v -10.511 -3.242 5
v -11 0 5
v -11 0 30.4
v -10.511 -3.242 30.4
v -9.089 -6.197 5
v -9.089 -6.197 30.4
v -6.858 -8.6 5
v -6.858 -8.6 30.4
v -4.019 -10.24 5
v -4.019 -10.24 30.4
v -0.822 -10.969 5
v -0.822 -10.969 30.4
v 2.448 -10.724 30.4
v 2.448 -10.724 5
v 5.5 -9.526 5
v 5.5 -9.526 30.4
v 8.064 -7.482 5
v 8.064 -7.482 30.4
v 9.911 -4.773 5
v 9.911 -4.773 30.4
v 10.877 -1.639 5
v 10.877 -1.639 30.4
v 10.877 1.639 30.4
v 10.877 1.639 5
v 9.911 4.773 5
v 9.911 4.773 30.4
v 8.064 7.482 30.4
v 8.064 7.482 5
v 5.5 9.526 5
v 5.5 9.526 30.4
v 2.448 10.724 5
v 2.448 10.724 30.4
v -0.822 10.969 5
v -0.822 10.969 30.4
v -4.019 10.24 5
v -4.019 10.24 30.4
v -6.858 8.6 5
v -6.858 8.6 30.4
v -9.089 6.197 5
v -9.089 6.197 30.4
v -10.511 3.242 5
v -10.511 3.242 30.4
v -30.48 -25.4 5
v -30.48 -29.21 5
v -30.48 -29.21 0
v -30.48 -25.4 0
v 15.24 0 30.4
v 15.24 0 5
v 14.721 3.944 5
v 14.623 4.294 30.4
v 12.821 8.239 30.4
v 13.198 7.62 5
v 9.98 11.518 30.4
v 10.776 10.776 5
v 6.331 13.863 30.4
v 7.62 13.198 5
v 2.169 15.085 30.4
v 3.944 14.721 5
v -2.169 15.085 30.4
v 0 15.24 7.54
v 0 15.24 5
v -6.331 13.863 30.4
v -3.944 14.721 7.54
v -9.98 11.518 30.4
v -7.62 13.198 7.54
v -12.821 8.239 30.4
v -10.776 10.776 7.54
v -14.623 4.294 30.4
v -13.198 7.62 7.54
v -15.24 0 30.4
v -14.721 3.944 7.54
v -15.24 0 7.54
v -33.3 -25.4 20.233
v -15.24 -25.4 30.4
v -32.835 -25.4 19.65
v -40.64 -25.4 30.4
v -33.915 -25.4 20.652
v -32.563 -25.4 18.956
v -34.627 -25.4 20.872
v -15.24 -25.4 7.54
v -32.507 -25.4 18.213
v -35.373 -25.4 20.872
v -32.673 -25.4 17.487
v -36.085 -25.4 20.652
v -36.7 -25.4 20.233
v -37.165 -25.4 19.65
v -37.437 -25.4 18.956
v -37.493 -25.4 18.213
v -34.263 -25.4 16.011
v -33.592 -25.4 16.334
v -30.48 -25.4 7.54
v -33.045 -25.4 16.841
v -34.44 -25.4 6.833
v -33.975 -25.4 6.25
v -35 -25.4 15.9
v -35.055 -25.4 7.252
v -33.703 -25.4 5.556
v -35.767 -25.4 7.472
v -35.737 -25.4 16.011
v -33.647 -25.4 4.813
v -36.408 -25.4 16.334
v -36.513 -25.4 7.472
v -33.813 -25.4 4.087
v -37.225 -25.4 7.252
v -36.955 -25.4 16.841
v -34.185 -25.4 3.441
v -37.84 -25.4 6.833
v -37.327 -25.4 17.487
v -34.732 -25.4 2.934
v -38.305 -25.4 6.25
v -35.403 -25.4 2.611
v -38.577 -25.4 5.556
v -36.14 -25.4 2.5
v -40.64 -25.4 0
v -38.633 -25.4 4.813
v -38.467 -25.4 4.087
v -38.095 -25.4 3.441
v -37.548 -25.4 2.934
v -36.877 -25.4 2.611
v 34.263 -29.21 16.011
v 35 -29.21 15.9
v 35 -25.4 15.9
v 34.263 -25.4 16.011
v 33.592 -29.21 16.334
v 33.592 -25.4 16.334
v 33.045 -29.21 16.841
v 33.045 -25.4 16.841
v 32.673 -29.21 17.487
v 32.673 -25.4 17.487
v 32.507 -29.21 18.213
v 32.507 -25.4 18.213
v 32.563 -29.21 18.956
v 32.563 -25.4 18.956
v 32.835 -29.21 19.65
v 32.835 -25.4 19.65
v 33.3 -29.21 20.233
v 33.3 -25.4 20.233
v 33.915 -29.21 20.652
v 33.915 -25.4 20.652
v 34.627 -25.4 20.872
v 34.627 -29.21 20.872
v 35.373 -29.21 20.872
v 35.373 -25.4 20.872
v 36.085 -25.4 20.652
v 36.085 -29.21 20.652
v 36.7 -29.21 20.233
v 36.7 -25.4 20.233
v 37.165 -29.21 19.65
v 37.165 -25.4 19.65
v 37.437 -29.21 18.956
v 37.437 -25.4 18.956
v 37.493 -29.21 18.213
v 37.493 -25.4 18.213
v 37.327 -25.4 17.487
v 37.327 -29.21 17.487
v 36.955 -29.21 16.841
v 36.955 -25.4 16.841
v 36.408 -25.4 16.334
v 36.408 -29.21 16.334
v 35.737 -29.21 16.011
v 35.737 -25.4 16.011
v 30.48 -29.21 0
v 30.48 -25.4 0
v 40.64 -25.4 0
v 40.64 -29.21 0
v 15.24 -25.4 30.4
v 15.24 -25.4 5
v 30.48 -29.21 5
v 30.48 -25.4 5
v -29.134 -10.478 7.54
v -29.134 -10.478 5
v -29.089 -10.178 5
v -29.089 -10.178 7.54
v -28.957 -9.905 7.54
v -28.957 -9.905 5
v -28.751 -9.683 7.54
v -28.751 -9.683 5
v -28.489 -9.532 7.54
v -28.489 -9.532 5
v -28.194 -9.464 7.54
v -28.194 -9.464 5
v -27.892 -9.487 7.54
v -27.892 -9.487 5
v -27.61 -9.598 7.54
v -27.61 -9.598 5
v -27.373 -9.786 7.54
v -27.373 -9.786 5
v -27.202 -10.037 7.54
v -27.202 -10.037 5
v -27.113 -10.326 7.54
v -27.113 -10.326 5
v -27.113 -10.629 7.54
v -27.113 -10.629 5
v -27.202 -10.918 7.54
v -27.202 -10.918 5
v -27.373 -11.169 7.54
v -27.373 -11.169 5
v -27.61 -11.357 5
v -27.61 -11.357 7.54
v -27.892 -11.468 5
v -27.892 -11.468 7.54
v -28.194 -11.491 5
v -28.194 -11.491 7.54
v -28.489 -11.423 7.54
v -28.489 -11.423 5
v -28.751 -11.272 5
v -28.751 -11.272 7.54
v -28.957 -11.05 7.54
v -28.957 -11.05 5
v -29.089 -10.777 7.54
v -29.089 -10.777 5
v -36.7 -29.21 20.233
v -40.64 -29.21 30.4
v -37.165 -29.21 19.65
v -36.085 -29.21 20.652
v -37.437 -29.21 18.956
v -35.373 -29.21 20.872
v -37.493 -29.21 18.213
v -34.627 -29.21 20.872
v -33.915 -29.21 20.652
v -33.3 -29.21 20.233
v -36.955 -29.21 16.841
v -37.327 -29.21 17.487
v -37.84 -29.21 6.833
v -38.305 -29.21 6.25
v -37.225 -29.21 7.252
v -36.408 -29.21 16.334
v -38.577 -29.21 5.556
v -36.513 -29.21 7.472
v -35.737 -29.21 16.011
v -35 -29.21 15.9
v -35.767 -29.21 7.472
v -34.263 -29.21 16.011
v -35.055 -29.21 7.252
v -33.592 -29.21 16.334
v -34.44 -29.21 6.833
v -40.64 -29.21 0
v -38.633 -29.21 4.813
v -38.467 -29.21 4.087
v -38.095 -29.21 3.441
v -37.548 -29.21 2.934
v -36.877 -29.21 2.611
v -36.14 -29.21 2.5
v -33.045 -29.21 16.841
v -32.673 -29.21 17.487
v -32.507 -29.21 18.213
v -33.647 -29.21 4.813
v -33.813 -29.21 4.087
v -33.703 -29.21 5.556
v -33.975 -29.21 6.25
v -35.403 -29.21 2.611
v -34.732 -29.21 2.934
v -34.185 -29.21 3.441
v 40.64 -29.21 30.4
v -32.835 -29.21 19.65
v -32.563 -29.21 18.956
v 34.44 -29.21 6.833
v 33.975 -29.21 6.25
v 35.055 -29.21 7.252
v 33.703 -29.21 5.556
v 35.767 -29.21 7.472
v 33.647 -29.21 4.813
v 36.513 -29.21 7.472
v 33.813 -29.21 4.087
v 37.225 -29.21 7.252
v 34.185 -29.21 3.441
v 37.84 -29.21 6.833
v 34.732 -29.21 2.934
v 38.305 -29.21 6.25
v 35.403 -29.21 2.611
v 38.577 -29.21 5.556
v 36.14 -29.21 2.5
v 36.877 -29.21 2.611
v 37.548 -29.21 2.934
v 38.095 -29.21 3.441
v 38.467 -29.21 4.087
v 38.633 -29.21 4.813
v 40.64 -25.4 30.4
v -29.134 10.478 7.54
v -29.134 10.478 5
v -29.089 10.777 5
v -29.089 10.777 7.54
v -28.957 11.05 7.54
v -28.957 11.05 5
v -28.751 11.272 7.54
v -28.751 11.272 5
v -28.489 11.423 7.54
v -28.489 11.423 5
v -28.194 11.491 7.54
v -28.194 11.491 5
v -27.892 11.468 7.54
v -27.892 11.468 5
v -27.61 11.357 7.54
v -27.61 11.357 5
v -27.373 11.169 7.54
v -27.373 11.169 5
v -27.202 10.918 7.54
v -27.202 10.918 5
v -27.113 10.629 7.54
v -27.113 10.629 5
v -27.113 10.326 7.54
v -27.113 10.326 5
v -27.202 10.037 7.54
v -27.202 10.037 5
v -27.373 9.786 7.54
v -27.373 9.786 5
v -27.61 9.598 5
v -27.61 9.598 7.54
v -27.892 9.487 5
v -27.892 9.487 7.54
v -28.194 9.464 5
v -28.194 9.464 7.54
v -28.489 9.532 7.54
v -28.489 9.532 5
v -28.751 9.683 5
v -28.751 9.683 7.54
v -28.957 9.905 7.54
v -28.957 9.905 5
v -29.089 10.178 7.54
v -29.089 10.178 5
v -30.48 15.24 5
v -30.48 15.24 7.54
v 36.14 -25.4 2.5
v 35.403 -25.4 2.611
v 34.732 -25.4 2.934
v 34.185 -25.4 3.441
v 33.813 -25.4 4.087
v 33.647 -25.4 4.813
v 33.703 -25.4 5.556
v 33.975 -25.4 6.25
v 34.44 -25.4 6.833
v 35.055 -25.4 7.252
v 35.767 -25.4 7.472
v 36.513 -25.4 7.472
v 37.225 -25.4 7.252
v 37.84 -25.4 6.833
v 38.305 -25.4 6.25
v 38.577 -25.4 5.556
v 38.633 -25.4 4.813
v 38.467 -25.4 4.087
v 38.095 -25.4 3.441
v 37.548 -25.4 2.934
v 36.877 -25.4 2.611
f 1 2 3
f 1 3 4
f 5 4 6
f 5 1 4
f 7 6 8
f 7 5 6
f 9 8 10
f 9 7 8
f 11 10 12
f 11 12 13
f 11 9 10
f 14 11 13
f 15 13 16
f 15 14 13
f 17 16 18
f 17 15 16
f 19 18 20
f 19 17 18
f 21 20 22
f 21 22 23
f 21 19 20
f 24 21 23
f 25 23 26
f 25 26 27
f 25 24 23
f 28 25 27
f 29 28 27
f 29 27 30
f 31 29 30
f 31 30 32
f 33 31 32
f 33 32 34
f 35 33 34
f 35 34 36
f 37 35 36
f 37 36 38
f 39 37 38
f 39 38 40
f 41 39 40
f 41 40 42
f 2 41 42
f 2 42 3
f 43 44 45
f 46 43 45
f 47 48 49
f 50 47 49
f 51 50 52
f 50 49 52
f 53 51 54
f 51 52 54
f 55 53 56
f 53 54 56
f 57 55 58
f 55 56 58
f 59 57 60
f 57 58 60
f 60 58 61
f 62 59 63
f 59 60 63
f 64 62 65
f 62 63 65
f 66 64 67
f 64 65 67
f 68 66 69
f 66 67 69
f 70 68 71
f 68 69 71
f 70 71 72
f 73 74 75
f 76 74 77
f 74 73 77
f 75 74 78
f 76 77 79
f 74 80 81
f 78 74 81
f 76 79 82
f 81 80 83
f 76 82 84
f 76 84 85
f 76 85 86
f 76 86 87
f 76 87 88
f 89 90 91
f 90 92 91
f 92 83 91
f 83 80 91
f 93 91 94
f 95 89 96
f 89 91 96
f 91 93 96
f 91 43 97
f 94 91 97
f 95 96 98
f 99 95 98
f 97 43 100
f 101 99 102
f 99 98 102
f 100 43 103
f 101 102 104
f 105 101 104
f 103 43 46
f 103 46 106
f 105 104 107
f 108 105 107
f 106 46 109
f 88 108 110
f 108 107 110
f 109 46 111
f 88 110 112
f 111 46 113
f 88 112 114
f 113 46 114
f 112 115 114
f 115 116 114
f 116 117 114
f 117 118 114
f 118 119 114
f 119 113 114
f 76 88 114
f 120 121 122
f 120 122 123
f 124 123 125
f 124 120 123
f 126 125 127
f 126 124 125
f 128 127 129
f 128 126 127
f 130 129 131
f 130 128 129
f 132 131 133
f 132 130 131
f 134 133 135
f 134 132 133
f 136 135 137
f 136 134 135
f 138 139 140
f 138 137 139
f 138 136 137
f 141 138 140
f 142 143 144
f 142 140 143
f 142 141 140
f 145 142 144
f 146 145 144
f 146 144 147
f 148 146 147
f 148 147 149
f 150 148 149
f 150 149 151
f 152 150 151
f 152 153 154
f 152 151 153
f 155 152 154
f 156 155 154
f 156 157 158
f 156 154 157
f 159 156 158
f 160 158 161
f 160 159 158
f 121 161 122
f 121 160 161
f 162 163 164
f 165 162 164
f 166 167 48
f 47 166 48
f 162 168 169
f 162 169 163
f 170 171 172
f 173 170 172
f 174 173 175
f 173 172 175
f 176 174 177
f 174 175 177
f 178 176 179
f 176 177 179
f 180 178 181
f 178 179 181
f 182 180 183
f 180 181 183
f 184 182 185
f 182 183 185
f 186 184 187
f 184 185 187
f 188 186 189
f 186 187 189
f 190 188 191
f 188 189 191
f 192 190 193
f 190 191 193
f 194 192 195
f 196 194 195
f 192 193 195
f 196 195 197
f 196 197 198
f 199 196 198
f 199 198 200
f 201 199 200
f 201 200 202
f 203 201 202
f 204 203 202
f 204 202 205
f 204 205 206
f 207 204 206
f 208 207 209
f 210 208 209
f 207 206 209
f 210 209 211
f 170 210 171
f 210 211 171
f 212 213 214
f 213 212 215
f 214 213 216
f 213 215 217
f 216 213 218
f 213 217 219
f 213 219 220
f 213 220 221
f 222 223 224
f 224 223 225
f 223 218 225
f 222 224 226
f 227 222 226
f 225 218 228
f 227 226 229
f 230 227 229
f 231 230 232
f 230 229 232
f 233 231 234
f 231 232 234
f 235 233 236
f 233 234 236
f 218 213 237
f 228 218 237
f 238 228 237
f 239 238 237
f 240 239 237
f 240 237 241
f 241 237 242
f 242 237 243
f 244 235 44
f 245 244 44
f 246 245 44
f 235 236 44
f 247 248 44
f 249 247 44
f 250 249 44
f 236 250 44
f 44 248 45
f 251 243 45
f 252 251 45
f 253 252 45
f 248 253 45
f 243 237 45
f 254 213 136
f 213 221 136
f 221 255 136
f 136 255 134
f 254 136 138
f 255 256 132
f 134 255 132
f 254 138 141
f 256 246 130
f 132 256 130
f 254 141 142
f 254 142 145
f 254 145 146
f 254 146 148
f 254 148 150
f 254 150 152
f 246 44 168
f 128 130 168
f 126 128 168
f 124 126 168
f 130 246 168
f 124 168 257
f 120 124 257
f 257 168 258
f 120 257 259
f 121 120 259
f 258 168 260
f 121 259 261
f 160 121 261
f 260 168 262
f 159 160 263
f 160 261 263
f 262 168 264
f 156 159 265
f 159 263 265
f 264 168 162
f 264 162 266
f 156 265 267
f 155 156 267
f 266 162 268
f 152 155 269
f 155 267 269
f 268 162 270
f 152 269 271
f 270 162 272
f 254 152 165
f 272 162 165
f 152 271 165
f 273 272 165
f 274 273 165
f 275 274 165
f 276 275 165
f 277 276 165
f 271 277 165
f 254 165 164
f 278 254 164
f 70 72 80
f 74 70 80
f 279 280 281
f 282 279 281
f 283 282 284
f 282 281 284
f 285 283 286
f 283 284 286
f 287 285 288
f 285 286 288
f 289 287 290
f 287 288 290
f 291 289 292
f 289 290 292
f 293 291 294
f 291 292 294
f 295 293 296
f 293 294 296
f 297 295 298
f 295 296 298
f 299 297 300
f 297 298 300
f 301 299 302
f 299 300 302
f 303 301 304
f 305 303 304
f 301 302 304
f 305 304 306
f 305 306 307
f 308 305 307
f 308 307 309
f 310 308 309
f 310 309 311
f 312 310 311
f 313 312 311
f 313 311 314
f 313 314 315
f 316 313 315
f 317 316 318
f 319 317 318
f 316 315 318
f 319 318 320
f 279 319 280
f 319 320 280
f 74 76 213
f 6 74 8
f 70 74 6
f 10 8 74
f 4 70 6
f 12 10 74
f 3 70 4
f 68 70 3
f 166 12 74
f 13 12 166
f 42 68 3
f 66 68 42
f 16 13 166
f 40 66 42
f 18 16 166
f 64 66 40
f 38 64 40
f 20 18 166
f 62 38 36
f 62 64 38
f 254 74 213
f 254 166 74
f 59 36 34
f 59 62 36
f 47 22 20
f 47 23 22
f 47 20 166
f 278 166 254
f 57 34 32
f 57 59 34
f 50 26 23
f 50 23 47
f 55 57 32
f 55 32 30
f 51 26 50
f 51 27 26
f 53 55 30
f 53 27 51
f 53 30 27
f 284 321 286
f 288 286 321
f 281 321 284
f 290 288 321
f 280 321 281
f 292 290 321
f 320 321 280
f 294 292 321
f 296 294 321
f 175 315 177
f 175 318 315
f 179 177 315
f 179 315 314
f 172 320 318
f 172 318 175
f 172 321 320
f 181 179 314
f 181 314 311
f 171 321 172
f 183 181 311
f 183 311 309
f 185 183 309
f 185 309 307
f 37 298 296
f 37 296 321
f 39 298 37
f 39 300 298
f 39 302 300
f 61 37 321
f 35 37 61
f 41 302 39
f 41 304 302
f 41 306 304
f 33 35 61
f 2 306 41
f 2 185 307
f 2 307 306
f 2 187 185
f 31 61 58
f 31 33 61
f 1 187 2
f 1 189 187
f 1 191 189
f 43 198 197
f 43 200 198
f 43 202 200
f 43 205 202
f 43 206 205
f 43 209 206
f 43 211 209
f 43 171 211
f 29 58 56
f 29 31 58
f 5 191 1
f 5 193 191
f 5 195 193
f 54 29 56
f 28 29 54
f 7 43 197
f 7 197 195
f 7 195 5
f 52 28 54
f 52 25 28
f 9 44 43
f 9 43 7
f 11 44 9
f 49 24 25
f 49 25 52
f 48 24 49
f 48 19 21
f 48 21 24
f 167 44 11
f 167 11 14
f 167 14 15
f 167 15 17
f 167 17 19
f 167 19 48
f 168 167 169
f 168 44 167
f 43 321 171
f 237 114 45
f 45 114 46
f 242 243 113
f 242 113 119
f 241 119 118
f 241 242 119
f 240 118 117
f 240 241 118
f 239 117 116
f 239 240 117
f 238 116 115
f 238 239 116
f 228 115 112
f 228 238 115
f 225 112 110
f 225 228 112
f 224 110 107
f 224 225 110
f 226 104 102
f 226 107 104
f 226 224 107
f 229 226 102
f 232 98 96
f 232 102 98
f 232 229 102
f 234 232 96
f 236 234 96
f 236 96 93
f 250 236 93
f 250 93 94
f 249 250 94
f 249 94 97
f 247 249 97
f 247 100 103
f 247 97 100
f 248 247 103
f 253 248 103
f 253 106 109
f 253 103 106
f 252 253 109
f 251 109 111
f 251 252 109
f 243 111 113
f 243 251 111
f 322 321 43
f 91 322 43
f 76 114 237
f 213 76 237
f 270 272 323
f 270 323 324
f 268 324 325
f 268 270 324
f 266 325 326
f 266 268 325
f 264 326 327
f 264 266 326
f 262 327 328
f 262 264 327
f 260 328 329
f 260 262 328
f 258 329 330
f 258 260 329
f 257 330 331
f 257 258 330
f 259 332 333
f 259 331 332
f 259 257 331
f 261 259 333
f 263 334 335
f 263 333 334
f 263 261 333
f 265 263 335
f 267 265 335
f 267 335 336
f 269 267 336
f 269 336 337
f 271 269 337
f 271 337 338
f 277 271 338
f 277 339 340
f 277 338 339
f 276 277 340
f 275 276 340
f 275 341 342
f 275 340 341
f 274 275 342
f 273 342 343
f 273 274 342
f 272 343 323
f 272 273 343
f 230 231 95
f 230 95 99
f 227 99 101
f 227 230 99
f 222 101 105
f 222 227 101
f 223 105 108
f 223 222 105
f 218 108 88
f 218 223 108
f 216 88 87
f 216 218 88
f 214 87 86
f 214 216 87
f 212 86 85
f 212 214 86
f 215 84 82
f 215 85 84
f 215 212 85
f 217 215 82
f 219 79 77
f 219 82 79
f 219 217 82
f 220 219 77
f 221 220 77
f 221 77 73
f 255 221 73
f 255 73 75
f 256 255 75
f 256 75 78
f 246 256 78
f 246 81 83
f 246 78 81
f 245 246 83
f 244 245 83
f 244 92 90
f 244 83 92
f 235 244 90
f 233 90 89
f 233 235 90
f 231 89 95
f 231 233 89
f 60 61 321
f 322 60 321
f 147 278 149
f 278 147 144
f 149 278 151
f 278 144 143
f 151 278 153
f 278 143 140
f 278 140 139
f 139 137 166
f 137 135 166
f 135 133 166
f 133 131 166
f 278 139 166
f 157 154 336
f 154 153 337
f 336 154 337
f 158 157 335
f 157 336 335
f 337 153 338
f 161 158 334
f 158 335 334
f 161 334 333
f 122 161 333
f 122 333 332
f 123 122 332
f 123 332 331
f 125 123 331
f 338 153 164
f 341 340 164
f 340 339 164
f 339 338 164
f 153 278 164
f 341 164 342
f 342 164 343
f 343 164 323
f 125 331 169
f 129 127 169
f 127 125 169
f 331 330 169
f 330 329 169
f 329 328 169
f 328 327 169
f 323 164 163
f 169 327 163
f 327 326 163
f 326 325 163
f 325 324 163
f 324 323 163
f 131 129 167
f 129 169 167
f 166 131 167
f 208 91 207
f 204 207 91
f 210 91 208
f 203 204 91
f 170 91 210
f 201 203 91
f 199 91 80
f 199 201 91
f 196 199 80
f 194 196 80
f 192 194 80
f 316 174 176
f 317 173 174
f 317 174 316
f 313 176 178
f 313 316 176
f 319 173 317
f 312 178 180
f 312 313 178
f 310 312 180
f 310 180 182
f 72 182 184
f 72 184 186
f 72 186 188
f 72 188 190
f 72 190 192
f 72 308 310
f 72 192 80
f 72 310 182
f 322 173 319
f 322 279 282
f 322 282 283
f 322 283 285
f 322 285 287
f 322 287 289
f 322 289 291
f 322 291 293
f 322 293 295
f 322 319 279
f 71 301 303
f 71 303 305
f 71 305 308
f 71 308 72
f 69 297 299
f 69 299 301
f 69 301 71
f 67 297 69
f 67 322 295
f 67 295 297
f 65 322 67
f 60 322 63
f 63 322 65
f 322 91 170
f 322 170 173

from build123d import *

# Parameters (mm, degrees)
SKETCH1_R               = 11
BOSS_EXTRUDE1_DEPTH     = 30.4
CUT_EXTRUDE1_DEPTH      = 65.4
CUT_EXTRUDE1_DEPTH_BACK = 30.4
SKETCH2_R               = 2.5
SKETCH2_W               = 60.96
SKETCH2_H               = 5
SKETCH3_R               = 1.016
BOSS_EXTRUDE2_DEPTH     = 2.54


with BuildPart() as part:
    # Sketch1 → Boss-Extrude1 (new body)
    with BuildSketch(Plane.XY):
        with BuildLine():
            Line((-40.64, -29.21), (40.64, -29.21))
            Line((40.64, -29.21), (40.64, -25.4))
            Line((40.64, -25.4), (15.24, -25.4))
            Line((15.24, -25.4), (15.24, 0))
            ThreePointArc((15.24, 0), (0, 15.24), (-15.24, 0))
            Line((-15.24, 0), (-15.24, -25.4))
            Line((-15.24, -25.4), (-40.64, -25.4))
            Line((-40.64, -25.4), (-40.64, -29.21))
        make_face()
        with Locations(Location((0, 0, 0), (0, 0, 180))):
            Circle(SKETCH1_R, mode=Mode.SUBTRACT)
    extrude(amount=BOSS_EXTRUDE1_DEPTH)

    # Sketch2 → Cut-Extrude1 (cut, two sides: drawn at the far end of the back side and taken through both)
    with BuildSketch(Plane(origin=(0, -25.4, 0), x_dir=(1, 0, 0), z_dir=(0, 1, 0)).offset(-CUT_EXTRUDE1_DEPTH_BACK)):
        with Locations(Location((-36.14, -5, 0), (0, 0, 90))):
            Circle(SKETCH2_R)
        with Locations(Location((-35, -18.4, 0), (0, 0, 90))):
            Circle(SKETCH2_R)
        with Locations(Location((36.14, -5, 0), (0, 0, 90))):
            Circle(SKETCH2_R)
        with Locations(Location((35, -18.4, 0), (0, 0, 90))):
            Circle(SKETCH2_R)
        with Locations((0, -2.5)):
            Rectangle(SKETCH2_W, SKETCH2_H)
    extrude(amount=CUT_EXTRUDE1_DEPTH + CUT_EXTRUDE1_DEPTH_BACK, mode=Mode.SUBTRACT)

    # Sketch3 → Boss-Extrude2 (add)
    with BuildSketch(Plane(origin=(0, 0, 5), x_dir=(-1, 0, 0), z_dir=(0, 0, -1))):
        with BuildLine():
            Line((0, 11), (0, 15.24))
            Line((0, 15.24), (30.48, 15.24))
            Line((30.48, 15.24), (30.48, -25.4))
            Line((30.48, -25.4), (0, -25.4))
            Line((0, -25.4), (0, -11))
            ThreePointArc((0, -11), (11, 0), (0, 11))
        make_face()
        with Locations((28.1178, 10.4775)):
            Circle(SKETCH3_R, mode=Mode.SUBTRACT)
        with Locations((28.1178, -10.4775)):
            Circle(SKETCH3_R, mode=Mode.SUBTRACT)
    extrude(amount=-BOSS_EXTRUDE2_DEPTH)


solid = part.part
